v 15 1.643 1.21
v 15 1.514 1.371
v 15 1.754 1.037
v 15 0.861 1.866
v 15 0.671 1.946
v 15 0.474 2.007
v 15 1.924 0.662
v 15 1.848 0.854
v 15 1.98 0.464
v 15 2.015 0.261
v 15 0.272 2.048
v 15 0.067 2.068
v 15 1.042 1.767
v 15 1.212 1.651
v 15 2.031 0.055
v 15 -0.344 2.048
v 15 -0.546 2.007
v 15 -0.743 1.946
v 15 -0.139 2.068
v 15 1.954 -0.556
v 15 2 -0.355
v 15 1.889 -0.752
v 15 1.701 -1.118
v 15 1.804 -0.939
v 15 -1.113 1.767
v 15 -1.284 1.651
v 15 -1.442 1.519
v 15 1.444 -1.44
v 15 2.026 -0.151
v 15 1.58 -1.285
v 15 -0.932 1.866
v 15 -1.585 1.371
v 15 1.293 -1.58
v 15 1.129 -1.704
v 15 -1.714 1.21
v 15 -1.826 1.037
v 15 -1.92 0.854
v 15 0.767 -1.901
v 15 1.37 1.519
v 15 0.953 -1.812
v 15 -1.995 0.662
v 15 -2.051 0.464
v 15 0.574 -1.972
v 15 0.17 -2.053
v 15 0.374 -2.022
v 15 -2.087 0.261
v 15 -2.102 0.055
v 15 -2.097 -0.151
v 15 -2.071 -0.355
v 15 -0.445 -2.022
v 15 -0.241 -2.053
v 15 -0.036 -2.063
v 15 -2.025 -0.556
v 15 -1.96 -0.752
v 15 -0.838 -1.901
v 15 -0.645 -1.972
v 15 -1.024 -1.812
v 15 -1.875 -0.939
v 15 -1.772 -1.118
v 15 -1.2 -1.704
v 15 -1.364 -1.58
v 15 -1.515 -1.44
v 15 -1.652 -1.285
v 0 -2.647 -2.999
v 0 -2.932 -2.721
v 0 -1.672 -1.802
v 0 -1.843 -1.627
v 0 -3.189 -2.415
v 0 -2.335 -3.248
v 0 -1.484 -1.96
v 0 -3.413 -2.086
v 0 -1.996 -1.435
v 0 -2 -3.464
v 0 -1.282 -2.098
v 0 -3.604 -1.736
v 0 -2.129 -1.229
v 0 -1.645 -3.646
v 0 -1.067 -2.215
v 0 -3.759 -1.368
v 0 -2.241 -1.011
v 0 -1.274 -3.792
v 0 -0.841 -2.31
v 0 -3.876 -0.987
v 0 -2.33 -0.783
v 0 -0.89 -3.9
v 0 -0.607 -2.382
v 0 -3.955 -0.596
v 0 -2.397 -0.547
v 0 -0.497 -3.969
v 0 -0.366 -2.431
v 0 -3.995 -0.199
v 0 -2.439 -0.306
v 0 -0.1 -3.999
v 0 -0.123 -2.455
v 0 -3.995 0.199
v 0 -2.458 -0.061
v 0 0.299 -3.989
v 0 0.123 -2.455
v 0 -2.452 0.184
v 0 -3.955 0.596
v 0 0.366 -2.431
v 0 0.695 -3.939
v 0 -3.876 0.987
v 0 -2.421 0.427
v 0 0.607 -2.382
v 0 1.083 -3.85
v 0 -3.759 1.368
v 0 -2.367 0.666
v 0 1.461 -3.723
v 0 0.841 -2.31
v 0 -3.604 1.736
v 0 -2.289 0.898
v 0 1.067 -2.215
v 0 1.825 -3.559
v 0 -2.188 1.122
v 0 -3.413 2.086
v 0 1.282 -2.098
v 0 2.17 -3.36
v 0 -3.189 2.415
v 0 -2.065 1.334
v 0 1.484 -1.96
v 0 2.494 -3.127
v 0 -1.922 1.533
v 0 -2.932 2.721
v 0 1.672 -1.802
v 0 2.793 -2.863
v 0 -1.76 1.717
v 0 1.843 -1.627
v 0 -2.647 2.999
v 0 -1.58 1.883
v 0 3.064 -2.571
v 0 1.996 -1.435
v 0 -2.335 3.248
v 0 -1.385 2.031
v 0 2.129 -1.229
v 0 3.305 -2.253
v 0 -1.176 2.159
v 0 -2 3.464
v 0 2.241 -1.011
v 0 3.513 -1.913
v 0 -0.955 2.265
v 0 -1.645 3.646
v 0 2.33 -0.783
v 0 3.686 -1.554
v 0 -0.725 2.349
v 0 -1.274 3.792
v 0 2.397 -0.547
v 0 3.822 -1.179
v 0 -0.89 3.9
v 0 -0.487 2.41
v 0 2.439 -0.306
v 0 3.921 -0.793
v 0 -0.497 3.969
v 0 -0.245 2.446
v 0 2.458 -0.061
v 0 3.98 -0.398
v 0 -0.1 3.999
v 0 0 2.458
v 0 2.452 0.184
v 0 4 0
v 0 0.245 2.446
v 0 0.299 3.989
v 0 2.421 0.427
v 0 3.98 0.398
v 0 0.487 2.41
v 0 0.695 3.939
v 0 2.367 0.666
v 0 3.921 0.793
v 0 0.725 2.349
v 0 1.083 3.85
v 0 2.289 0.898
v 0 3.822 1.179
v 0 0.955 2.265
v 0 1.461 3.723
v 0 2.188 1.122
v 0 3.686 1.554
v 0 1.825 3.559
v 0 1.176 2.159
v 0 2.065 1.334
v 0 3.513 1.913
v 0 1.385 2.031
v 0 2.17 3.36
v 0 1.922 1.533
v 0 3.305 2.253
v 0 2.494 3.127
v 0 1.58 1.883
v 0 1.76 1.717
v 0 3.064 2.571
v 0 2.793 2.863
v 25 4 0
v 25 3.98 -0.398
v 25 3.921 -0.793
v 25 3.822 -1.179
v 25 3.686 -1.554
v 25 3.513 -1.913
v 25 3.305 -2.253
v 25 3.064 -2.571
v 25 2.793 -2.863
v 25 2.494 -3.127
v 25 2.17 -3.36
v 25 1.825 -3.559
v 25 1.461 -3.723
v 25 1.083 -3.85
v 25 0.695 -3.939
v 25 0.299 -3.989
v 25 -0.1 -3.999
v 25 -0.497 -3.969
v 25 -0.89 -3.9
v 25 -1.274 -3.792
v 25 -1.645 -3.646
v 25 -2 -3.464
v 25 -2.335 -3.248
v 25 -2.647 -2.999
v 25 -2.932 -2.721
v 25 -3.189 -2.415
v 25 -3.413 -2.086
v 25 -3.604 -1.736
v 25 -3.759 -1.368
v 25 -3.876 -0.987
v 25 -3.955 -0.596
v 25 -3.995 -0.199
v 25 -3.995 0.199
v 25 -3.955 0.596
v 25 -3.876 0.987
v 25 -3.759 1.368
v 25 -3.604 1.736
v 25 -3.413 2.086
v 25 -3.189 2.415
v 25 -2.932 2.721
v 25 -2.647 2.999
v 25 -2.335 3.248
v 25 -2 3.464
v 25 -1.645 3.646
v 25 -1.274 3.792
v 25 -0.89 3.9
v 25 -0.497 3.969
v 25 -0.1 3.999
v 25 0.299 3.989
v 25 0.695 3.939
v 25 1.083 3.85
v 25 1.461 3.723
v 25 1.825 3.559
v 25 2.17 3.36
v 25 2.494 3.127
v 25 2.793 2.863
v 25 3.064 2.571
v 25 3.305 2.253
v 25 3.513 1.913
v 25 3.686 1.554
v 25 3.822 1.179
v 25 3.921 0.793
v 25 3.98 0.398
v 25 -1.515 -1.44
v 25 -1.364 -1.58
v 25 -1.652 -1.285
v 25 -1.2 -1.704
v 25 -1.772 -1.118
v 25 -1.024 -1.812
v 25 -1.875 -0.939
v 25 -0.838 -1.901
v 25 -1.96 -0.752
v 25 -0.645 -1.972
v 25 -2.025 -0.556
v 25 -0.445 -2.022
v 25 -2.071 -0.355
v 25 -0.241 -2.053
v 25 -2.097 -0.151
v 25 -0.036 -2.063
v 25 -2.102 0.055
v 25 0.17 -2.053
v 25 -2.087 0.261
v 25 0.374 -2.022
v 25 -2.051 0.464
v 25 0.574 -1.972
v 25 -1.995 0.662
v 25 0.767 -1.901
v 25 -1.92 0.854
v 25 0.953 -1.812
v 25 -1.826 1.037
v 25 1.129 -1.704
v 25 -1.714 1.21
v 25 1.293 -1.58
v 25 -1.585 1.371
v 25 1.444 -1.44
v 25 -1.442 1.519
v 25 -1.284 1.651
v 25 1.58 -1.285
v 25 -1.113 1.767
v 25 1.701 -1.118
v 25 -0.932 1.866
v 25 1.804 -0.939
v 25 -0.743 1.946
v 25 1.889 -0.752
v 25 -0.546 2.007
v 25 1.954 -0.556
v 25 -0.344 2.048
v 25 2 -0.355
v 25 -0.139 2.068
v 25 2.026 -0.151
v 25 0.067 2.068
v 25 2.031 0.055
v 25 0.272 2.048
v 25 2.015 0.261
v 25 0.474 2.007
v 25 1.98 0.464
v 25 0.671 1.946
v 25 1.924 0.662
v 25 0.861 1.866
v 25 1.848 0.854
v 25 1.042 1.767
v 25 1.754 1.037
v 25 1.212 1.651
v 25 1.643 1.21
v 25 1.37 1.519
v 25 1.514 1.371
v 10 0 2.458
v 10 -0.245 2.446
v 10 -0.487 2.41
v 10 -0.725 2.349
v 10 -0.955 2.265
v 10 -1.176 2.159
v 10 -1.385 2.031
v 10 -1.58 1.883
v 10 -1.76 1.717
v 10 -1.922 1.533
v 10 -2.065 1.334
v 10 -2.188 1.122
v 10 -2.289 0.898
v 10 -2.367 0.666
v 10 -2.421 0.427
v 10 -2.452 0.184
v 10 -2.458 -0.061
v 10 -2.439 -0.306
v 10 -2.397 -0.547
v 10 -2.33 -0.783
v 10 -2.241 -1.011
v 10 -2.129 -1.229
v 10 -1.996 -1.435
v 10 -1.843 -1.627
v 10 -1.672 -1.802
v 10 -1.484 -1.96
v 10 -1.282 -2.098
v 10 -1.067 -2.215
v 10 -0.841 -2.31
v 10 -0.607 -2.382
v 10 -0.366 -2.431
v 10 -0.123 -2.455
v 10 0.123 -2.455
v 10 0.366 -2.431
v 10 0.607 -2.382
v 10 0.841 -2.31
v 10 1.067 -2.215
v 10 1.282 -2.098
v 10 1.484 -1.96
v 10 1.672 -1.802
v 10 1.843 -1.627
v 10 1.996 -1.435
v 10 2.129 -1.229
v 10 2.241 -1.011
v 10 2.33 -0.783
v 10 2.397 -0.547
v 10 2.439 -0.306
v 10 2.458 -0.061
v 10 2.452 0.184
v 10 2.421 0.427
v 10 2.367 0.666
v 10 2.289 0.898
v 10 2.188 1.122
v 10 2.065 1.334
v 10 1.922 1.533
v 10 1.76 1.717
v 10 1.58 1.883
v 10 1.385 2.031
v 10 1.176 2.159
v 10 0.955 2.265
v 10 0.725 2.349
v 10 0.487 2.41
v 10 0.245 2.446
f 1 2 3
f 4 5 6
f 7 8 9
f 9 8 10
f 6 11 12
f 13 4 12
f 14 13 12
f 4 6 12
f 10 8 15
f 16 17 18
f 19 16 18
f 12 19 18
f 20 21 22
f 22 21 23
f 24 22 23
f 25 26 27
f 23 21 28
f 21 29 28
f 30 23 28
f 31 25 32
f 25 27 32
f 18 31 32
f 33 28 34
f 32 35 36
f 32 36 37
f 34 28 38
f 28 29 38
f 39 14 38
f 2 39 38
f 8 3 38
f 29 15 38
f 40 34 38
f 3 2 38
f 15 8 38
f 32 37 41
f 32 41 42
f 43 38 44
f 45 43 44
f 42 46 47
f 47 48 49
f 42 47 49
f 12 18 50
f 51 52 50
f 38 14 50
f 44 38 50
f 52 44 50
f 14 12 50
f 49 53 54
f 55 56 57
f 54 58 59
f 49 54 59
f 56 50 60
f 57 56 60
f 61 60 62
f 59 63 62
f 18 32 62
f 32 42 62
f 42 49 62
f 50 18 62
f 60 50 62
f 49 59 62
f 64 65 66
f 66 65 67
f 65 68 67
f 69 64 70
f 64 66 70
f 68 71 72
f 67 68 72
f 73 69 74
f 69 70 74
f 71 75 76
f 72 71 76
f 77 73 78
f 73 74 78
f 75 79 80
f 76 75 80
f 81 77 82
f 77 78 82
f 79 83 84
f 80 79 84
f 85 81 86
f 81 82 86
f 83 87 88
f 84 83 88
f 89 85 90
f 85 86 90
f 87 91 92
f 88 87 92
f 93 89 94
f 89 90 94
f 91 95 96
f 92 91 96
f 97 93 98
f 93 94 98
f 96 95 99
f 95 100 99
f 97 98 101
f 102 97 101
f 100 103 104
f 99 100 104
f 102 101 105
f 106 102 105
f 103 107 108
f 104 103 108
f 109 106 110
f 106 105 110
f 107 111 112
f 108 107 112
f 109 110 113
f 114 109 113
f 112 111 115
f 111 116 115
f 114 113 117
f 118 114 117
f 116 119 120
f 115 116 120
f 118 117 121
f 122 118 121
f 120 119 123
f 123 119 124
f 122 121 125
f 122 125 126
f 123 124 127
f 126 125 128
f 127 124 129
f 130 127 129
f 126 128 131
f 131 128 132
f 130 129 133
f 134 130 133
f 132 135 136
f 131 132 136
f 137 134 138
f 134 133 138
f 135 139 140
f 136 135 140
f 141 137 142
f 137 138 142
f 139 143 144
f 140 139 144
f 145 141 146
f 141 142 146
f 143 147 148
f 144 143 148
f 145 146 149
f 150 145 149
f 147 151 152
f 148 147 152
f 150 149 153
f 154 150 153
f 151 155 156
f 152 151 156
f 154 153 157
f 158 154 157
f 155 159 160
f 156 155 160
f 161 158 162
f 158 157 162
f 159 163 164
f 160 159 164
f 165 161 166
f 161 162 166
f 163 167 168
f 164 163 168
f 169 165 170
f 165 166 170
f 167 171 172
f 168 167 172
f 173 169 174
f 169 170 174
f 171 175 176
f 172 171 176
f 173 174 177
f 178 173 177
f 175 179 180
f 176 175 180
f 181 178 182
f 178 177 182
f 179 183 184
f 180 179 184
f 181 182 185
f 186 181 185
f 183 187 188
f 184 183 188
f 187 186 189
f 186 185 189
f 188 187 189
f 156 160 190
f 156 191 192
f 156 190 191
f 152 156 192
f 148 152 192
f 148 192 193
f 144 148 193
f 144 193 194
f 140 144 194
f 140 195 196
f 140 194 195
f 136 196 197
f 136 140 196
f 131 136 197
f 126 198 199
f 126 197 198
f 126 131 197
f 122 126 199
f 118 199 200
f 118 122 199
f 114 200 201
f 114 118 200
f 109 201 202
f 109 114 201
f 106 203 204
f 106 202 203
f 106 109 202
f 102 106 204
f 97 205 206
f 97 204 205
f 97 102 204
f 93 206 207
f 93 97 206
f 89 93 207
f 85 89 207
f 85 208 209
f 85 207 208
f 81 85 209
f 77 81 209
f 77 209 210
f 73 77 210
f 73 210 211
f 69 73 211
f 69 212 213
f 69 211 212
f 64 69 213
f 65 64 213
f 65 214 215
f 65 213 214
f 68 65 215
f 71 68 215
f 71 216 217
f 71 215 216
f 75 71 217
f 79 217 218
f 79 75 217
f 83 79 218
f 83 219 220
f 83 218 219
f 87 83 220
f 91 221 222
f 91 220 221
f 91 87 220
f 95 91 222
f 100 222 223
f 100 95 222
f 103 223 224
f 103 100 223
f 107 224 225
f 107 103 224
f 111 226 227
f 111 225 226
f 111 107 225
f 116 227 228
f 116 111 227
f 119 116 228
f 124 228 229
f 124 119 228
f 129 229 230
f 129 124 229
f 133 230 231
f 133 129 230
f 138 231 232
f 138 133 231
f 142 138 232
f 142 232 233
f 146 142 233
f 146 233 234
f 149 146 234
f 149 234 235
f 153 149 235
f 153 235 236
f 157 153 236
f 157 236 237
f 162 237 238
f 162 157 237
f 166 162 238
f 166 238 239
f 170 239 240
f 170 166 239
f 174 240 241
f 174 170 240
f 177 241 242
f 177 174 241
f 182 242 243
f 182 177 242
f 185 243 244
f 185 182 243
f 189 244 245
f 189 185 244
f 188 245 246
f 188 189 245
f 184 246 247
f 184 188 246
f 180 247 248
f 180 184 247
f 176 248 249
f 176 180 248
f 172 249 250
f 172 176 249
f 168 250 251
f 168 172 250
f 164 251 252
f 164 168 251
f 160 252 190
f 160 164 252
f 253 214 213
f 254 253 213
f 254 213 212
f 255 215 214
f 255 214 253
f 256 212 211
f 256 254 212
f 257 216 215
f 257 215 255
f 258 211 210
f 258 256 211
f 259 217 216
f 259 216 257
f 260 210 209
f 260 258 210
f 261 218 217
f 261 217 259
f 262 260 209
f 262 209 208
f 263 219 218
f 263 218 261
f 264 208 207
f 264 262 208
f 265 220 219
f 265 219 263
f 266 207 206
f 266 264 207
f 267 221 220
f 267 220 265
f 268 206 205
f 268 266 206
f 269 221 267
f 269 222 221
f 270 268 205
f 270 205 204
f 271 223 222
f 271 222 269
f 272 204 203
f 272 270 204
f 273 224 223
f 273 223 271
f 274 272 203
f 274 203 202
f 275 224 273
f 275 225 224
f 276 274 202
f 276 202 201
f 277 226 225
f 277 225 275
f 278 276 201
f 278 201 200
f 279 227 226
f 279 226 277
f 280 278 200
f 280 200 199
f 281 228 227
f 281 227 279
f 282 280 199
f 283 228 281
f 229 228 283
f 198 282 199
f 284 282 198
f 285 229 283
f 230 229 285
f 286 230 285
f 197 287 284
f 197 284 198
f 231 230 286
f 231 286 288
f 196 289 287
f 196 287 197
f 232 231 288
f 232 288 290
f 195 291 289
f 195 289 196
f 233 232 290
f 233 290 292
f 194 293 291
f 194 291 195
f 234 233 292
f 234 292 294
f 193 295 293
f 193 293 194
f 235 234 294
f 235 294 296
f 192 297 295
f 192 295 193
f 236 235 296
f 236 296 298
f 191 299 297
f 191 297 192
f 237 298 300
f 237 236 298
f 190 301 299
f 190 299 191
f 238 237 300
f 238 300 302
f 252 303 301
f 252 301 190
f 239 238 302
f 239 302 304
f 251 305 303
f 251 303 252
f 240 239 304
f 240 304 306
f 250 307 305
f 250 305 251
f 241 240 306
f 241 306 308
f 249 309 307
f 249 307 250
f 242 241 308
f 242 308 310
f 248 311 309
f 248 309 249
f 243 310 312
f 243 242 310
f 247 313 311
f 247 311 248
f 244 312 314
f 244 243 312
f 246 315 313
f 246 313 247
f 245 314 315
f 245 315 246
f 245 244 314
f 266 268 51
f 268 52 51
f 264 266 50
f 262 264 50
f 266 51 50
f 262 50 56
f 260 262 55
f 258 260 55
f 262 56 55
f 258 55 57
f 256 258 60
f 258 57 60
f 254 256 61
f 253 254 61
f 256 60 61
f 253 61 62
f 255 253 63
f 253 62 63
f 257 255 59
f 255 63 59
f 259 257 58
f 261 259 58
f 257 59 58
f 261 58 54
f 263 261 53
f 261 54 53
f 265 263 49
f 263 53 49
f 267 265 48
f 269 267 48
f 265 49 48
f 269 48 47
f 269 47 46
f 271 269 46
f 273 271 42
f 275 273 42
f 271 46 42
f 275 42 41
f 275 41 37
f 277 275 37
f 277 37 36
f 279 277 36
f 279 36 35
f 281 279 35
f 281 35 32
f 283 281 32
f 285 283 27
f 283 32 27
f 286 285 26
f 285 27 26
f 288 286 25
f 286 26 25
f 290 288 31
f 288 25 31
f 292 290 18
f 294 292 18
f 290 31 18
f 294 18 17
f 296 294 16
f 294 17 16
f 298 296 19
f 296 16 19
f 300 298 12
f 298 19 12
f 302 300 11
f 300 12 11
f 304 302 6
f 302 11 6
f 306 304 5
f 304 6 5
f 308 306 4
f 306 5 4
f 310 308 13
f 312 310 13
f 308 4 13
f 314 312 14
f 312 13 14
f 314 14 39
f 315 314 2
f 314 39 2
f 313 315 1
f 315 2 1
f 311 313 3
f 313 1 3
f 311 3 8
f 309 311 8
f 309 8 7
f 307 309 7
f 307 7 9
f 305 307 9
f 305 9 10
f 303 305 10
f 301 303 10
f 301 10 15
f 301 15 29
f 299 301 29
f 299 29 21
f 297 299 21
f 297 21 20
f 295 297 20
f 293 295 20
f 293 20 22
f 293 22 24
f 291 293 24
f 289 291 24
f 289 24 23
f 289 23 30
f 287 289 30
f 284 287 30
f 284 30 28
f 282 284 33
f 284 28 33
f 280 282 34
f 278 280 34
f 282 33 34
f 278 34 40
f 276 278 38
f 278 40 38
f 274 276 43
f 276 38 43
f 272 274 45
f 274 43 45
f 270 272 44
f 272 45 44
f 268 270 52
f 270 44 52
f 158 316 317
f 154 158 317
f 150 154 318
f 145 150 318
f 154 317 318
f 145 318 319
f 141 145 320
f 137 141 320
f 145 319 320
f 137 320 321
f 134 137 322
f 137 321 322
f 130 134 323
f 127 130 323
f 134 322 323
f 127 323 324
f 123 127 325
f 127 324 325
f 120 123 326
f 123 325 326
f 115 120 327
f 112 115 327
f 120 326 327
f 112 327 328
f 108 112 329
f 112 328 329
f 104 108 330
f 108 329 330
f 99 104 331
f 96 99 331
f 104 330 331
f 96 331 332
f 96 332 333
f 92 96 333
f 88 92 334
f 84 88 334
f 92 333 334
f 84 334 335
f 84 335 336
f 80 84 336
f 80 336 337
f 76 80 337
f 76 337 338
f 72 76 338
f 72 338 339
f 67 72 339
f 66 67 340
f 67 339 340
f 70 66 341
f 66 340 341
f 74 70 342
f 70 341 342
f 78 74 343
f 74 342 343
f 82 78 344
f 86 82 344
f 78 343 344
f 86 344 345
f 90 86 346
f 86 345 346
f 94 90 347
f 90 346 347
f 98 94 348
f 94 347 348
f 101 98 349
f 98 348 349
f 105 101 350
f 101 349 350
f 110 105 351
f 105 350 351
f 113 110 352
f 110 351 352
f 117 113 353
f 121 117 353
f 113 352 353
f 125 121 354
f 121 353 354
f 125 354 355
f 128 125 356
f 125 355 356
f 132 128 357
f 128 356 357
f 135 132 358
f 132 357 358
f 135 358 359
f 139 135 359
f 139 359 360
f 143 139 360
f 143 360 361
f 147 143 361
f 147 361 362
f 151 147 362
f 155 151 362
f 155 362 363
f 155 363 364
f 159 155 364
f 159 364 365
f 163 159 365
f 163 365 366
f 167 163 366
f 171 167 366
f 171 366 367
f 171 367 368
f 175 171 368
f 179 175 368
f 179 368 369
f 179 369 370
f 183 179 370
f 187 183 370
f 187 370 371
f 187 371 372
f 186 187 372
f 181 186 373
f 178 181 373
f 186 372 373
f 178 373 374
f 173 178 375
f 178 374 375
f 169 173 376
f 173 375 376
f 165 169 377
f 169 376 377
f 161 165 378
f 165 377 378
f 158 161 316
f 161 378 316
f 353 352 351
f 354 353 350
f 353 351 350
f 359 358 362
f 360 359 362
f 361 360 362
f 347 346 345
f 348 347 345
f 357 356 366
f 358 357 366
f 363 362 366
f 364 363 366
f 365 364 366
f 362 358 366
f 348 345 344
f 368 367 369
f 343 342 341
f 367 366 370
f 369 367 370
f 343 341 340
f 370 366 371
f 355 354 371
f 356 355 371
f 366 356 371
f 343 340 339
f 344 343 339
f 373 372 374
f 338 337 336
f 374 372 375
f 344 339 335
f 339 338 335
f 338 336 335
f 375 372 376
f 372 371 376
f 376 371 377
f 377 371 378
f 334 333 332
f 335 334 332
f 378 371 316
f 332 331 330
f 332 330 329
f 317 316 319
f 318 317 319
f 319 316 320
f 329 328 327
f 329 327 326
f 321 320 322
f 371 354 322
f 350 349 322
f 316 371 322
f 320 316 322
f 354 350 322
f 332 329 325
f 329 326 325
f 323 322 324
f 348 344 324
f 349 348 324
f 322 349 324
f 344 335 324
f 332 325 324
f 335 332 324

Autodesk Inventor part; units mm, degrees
ref_plane "YZ Plane" through (0, 0, 0) normal (1, 0, 0) x (0, 1, 0)
ref_plane "XZ Plane" through (0, 0, 0) normal (0, 1, 0) x (-1, 0, 0)
ref_plane "XY Plane" through (0, 0, 0) normal (0, 0, 1) x (1, 0, 0)
sketch "Sketch1" plane through (0, 0, 0) normal (1, 0, 0) x (0, 1, 0)
  circle A0 centre (0, 0) radius 4
  dimension "d0" = 8
extrude "Extrusion1" add sketch "Sketch1" along normal blind 25
sketch "Sketch3" plane through (25, 0, 0) normal (1, 0, 0) x (0, 0, -1)
  point P0 (0, 0)
  point P1 (0, 0)
hole "Hole1" at (25, -0.0356, 0.0036) direction (-1, 0, 0) diameter 4.134 depth 10 thread size "M5x0.8" class "6H" standard "ISO Metric profile"
sketch "Sketch4" plane through (0, 0, 0) normal (-1, 0, 0) x (0, 0, 1)
  point P0 (0, 0)
  point P1 (0, 0)
hole "Hole2" at (0, 0, 0) direction (1, 0, 0) diameter 4.917 depth 10 thread size "M6x1" class "6H" standard "ANSI Metric M Profile"
properties part number "CopleCylinderSensor"
